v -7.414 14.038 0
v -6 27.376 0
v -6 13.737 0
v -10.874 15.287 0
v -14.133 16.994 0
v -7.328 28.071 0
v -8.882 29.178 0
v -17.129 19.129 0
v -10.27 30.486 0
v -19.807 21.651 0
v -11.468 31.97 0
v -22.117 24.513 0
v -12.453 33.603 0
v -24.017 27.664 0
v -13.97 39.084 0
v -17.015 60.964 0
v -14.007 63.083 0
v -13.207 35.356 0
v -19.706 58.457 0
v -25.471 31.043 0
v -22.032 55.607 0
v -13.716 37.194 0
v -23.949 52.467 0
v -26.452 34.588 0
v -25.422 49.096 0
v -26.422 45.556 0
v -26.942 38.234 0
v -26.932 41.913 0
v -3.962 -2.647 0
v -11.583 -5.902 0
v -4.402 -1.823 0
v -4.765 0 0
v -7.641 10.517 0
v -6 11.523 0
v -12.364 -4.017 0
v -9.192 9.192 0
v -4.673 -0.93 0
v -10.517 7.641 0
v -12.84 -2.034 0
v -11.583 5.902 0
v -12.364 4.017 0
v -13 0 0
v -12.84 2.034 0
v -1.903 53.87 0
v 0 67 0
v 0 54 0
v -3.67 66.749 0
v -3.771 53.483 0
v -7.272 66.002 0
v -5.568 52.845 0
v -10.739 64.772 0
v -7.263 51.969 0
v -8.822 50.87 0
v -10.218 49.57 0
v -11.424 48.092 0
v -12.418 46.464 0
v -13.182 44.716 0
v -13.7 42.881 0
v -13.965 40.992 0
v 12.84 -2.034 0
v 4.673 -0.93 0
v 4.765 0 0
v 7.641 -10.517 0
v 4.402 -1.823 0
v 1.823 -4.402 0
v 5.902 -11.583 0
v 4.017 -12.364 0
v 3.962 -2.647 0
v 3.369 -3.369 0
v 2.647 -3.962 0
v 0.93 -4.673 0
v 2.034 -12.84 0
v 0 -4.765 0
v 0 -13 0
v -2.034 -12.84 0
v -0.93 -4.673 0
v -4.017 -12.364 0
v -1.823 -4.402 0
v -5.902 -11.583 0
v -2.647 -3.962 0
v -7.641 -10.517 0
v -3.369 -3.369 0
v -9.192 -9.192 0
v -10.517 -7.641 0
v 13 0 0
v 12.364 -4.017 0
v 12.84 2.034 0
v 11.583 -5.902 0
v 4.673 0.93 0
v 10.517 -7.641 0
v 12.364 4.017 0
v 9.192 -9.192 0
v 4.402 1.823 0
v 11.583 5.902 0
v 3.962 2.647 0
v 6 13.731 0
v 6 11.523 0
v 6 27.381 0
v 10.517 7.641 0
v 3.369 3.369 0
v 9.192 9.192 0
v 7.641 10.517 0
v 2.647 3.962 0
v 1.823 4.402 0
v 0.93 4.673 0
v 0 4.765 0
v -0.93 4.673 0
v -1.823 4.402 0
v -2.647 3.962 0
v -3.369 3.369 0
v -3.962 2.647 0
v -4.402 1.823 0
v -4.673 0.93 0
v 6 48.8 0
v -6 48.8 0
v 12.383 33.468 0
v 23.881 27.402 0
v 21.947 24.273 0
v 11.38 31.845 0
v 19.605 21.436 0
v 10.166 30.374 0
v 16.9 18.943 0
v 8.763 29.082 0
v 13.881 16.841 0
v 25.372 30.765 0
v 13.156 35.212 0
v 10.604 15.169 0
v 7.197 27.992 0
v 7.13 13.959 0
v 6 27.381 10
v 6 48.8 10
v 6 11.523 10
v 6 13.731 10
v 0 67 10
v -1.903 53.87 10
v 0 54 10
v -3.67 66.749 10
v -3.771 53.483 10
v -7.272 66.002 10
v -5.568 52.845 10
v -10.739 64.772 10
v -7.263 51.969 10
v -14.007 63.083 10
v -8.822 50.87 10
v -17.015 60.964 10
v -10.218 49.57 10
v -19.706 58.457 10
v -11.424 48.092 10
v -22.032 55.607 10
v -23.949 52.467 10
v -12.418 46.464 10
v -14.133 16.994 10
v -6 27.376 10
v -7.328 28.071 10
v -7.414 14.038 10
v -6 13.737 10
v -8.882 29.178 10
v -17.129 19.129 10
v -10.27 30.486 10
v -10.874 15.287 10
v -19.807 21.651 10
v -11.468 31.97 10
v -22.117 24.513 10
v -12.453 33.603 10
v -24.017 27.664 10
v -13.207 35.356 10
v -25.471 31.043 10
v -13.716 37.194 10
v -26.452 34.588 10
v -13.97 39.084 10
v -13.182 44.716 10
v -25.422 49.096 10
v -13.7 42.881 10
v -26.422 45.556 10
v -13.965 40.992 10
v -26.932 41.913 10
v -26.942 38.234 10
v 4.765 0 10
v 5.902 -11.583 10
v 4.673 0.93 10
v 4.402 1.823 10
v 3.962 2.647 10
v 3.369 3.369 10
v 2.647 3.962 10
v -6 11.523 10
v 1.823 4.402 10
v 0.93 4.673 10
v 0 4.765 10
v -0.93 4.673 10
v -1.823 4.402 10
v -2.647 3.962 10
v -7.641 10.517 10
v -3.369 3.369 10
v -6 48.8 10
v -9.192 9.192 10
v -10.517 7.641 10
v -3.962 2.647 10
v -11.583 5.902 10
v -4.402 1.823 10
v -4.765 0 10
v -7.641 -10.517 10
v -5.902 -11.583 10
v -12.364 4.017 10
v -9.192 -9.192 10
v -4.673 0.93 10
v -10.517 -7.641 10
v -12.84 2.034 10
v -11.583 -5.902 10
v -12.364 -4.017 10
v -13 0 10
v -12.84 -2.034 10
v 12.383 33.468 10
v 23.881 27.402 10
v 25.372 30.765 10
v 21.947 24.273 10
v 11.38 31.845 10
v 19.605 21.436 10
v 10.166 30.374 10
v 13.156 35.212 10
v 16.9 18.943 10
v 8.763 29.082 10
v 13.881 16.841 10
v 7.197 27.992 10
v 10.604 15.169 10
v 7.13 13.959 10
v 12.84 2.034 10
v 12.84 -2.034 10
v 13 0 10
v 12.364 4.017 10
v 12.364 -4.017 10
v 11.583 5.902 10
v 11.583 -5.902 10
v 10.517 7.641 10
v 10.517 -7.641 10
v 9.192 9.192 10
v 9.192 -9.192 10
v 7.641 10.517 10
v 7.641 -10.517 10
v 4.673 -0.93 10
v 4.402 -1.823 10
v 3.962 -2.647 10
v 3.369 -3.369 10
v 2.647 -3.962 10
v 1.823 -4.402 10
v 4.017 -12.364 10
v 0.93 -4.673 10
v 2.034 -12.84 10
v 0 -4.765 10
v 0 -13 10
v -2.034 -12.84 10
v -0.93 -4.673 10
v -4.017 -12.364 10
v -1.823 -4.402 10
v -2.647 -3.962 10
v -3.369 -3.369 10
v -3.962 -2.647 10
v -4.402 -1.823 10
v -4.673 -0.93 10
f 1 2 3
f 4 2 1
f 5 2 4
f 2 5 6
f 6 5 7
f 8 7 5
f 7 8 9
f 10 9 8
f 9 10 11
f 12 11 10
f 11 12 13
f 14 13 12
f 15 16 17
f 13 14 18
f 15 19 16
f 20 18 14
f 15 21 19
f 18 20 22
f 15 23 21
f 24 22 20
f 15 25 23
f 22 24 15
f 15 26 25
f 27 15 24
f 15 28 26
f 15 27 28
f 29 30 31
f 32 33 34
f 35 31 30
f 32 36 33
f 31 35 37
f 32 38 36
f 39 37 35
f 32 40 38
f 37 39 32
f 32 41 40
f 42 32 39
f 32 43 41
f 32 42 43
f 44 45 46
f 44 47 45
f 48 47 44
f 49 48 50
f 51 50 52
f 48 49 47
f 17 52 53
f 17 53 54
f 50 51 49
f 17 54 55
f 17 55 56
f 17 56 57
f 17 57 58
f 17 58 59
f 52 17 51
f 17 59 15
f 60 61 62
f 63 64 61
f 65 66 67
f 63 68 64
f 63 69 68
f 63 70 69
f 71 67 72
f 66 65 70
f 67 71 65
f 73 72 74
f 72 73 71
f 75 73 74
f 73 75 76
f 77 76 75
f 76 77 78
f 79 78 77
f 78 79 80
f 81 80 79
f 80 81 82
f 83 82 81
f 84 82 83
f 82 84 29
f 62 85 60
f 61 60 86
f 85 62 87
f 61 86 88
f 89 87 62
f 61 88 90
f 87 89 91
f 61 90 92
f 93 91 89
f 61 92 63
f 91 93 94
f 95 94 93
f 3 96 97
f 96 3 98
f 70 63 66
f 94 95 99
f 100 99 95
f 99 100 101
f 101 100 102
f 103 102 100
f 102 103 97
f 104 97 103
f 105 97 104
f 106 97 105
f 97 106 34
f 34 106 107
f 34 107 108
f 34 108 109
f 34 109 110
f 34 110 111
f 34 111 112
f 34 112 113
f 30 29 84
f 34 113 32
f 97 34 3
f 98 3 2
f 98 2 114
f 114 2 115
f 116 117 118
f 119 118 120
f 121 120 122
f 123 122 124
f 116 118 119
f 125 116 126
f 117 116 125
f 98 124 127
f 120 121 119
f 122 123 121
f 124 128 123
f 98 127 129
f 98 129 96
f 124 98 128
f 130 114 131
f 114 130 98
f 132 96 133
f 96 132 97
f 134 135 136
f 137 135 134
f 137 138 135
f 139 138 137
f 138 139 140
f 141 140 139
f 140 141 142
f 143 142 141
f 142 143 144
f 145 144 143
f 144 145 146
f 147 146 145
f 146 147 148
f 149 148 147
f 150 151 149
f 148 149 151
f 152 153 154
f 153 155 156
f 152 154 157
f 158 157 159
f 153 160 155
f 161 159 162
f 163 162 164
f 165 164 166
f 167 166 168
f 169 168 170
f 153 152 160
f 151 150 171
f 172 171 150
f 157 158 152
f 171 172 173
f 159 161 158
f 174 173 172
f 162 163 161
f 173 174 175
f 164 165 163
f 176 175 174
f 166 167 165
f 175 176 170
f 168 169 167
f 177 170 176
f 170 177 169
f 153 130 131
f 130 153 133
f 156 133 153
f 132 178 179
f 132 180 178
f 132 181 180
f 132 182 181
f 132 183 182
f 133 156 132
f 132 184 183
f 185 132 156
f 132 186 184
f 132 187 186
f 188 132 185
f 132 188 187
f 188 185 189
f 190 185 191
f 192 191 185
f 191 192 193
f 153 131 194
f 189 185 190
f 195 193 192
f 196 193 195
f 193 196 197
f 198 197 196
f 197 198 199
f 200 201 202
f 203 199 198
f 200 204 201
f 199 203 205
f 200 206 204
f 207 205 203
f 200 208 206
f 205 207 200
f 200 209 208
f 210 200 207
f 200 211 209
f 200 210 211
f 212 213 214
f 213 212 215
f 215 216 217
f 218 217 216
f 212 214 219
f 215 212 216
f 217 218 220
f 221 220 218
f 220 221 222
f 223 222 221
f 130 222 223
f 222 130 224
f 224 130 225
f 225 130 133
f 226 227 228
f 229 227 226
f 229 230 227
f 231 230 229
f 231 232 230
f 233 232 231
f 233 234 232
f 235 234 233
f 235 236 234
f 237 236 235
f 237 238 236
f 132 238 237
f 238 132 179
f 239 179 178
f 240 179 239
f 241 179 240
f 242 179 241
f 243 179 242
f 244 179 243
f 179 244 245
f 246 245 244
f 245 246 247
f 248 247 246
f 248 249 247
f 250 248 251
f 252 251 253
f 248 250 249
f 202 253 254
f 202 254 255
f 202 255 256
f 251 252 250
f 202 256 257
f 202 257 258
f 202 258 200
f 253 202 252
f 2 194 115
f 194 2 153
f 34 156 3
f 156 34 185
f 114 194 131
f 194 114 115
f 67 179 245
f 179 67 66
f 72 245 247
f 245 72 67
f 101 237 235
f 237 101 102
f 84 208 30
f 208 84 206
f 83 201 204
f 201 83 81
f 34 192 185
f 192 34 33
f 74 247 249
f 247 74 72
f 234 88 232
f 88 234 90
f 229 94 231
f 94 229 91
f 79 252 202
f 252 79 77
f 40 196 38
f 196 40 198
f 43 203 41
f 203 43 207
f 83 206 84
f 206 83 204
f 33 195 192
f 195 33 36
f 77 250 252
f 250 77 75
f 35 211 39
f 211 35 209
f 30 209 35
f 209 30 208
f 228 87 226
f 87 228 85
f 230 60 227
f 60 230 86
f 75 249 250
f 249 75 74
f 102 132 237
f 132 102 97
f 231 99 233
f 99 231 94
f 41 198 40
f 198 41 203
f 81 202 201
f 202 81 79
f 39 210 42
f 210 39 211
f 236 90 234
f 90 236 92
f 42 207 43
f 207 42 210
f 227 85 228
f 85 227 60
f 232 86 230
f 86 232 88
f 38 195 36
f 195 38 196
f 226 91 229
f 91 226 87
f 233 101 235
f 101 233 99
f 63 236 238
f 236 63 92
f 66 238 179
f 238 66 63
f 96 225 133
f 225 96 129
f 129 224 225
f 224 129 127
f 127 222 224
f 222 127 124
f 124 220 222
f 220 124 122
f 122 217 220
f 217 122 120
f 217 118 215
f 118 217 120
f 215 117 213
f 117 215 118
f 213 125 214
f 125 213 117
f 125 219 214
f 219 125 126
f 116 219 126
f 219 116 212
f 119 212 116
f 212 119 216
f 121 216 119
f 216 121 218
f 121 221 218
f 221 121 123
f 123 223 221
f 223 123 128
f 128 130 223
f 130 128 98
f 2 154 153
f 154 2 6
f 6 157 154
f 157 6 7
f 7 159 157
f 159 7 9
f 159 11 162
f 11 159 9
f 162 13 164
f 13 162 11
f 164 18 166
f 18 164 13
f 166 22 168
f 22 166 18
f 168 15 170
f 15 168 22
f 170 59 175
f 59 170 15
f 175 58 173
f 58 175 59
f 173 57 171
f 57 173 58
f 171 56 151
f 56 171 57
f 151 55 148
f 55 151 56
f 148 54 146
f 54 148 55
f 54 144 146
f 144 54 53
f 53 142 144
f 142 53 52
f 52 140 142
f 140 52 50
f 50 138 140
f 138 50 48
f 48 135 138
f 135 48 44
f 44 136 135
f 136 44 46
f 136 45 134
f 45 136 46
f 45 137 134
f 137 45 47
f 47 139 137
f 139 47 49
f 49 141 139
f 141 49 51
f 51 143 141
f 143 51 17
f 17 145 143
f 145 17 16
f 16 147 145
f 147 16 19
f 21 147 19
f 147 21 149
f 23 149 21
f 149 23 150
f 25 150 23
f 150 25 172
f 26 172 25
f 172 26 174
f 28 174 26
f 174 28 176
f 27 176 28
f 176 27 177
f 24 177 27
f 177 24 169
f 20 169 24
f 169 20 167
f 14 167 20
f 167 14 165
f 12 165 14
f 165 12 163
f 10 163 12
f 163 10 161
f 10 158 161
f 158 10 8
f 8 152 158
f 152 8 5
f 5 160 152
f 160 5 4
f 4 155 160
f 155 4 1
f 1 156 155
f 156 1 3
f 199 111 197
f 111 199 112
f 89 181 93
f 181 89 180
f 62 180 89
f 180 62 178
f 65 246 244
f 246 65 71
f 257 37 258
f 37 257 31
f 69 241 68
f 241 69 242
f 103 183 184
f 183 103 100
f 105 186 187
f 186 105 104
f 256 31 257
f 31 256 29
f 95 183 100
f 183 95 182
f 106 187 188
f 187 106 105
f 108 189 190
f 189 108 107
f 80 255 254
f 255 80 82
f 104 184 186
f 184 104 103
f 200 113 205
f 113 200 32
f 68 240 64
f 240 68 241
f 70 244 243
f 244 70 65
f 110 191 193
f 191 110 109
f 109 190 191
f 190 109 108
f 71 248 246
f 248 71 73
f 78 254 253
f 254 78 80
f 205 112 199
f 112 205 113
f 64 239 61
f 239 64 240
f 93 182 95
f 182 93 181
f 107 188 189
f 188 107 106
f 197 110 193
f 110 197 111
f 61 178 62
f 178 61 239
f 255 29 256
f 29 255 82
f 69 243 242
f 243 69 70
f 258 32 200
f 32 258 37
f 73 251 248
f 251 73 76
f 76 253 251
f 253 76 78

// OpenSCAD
$fn = 32;

// ----------------------------------------------------------------------
// Hook: 80 mm shank into a 14 mm curl, 10 mm thick
// ----------------------------------------------------------------------

// --- parameters (mm) ---
shank_len = 80;           // shank length from the boss centre
shank_w = 12;             // shank width
boss_d = 26;              // boss diameter
bore_d = 9.53;            // boss bore
curl_in = 14;             // curl inner radius
curl_out = 27;            // curl outer radius
curl_sweep = 250;         // curl sweep angle
hook_t = 10;              // hook thickness

shank_profile = [[-6, 48.8], [6, 48.8], [6, 11], [-6, 11]];
boss_profile = [[13, 0], [12.84, 2.034], [12.364, 4.017], [11.583, 5.902], [10.517, 7.641], [9.192, 9.192], [7.641, 10.517], [5.902, 11.583], [4.017, 12.364], [2.034, 12.84], [0, 13], [-2.034, 12.84], [-4.017, 12.364], [-5.902, 11.583], [-7.641, 10.517], [-9.192, 9.192], [-10.517, 7.641], [-11.583, 5.902], [-12.364, 4.017], [-12.84, 2.034], [-13, 0], [-12.84, -2.034], [-12.364, -4.017], [-11.583, -5.902], [-10.517, -7.641], [-9.192, -9.192], [-7.641, -10.517], [-5.902, -11.583], [-4.017, -12.364], [-2.034, -12.84], [0, -13], [2.034, -12.84], [4.017, -12.364], [5.902, -11.583], [7.641, -10.517], [9.192, -9.192], [10.517, -7.641], [11.583, -5.902], [12.364, -4.017], [12.84, -2.034]];
curl_profile = [[0, 67], [-3.67, 66.749], [-7.272, 66.002], [-10.739, 64.772], [-14.007, 63.083], [-17.015, 60.964], [-19.706, 58.457], [-22.032, 55.607], [-23.949, 52.467], [-25.422, 49.096], [-26.422, 45.556], [-26.932, 41.913], [-26.942, 38.234], [-26.452, 34.588], [-25.471, 31.043], [-24.017, 27.664], [-22.117, 24.513], [-19.807, 21.651], [-17.129, 19.129], [-14.133, 16.994], [-10.874, 15.287], [-7.414, 14.038], [-3.816, 13.271], [-0.147, 13], [3.524, 13.231], [7.13, 13.959], [10.604, 15.169], [13.881, 16.841], [16.9, 18.943], [19.605, 21.436], [21.947, 24.273], [23.881, 27.402], [25.372, 30.765], [13.156, 35.212], [12.383, 33.468], [11.38, 31.845], [10.166, 30.374], [8.763, 29.082], [7.197, 27.992], [5.498, 27.125], [3.697, 26.497], [1.827, 26.12], [-0.076, 26], [-1.979, 26.141], [-3.844, 26.538], [-5.638, 27.186], [-7.328, 28.071], [-8.882, 29.178], [-10.27, 30.486], [-11.468, 31.97], [-12.453, 33.603], [-13.207, 35.356], [-13.716, 37.194], [-13.97, 39.084], [-13.965, 40.992], [-13.7, 42.881], [-13.182, 44.716], [-12.418, 46.464], [-11.424, 48.092], [-10.218, 49.57], [-8.822, 50.87], [-7.263, 51.969], [-5.568, 52.845], [-3.771, 53.483], [-1.903, 53.87], [0, 54]];

difference() {
  union() {
    /* three overlapping outlines: shank, boss and the smooth curl */
    linear_extrude(height = hook_t) polygon(shank_profile);
    linear_extrude(height = hook_t) polygon(boss_profile);
    linear_extrude(height = hook_t) polygon(curl_profile);
  }
  translate([0, 0, -2.5]) cylinder(h = hook_t + 5, d = bore_d);
}
